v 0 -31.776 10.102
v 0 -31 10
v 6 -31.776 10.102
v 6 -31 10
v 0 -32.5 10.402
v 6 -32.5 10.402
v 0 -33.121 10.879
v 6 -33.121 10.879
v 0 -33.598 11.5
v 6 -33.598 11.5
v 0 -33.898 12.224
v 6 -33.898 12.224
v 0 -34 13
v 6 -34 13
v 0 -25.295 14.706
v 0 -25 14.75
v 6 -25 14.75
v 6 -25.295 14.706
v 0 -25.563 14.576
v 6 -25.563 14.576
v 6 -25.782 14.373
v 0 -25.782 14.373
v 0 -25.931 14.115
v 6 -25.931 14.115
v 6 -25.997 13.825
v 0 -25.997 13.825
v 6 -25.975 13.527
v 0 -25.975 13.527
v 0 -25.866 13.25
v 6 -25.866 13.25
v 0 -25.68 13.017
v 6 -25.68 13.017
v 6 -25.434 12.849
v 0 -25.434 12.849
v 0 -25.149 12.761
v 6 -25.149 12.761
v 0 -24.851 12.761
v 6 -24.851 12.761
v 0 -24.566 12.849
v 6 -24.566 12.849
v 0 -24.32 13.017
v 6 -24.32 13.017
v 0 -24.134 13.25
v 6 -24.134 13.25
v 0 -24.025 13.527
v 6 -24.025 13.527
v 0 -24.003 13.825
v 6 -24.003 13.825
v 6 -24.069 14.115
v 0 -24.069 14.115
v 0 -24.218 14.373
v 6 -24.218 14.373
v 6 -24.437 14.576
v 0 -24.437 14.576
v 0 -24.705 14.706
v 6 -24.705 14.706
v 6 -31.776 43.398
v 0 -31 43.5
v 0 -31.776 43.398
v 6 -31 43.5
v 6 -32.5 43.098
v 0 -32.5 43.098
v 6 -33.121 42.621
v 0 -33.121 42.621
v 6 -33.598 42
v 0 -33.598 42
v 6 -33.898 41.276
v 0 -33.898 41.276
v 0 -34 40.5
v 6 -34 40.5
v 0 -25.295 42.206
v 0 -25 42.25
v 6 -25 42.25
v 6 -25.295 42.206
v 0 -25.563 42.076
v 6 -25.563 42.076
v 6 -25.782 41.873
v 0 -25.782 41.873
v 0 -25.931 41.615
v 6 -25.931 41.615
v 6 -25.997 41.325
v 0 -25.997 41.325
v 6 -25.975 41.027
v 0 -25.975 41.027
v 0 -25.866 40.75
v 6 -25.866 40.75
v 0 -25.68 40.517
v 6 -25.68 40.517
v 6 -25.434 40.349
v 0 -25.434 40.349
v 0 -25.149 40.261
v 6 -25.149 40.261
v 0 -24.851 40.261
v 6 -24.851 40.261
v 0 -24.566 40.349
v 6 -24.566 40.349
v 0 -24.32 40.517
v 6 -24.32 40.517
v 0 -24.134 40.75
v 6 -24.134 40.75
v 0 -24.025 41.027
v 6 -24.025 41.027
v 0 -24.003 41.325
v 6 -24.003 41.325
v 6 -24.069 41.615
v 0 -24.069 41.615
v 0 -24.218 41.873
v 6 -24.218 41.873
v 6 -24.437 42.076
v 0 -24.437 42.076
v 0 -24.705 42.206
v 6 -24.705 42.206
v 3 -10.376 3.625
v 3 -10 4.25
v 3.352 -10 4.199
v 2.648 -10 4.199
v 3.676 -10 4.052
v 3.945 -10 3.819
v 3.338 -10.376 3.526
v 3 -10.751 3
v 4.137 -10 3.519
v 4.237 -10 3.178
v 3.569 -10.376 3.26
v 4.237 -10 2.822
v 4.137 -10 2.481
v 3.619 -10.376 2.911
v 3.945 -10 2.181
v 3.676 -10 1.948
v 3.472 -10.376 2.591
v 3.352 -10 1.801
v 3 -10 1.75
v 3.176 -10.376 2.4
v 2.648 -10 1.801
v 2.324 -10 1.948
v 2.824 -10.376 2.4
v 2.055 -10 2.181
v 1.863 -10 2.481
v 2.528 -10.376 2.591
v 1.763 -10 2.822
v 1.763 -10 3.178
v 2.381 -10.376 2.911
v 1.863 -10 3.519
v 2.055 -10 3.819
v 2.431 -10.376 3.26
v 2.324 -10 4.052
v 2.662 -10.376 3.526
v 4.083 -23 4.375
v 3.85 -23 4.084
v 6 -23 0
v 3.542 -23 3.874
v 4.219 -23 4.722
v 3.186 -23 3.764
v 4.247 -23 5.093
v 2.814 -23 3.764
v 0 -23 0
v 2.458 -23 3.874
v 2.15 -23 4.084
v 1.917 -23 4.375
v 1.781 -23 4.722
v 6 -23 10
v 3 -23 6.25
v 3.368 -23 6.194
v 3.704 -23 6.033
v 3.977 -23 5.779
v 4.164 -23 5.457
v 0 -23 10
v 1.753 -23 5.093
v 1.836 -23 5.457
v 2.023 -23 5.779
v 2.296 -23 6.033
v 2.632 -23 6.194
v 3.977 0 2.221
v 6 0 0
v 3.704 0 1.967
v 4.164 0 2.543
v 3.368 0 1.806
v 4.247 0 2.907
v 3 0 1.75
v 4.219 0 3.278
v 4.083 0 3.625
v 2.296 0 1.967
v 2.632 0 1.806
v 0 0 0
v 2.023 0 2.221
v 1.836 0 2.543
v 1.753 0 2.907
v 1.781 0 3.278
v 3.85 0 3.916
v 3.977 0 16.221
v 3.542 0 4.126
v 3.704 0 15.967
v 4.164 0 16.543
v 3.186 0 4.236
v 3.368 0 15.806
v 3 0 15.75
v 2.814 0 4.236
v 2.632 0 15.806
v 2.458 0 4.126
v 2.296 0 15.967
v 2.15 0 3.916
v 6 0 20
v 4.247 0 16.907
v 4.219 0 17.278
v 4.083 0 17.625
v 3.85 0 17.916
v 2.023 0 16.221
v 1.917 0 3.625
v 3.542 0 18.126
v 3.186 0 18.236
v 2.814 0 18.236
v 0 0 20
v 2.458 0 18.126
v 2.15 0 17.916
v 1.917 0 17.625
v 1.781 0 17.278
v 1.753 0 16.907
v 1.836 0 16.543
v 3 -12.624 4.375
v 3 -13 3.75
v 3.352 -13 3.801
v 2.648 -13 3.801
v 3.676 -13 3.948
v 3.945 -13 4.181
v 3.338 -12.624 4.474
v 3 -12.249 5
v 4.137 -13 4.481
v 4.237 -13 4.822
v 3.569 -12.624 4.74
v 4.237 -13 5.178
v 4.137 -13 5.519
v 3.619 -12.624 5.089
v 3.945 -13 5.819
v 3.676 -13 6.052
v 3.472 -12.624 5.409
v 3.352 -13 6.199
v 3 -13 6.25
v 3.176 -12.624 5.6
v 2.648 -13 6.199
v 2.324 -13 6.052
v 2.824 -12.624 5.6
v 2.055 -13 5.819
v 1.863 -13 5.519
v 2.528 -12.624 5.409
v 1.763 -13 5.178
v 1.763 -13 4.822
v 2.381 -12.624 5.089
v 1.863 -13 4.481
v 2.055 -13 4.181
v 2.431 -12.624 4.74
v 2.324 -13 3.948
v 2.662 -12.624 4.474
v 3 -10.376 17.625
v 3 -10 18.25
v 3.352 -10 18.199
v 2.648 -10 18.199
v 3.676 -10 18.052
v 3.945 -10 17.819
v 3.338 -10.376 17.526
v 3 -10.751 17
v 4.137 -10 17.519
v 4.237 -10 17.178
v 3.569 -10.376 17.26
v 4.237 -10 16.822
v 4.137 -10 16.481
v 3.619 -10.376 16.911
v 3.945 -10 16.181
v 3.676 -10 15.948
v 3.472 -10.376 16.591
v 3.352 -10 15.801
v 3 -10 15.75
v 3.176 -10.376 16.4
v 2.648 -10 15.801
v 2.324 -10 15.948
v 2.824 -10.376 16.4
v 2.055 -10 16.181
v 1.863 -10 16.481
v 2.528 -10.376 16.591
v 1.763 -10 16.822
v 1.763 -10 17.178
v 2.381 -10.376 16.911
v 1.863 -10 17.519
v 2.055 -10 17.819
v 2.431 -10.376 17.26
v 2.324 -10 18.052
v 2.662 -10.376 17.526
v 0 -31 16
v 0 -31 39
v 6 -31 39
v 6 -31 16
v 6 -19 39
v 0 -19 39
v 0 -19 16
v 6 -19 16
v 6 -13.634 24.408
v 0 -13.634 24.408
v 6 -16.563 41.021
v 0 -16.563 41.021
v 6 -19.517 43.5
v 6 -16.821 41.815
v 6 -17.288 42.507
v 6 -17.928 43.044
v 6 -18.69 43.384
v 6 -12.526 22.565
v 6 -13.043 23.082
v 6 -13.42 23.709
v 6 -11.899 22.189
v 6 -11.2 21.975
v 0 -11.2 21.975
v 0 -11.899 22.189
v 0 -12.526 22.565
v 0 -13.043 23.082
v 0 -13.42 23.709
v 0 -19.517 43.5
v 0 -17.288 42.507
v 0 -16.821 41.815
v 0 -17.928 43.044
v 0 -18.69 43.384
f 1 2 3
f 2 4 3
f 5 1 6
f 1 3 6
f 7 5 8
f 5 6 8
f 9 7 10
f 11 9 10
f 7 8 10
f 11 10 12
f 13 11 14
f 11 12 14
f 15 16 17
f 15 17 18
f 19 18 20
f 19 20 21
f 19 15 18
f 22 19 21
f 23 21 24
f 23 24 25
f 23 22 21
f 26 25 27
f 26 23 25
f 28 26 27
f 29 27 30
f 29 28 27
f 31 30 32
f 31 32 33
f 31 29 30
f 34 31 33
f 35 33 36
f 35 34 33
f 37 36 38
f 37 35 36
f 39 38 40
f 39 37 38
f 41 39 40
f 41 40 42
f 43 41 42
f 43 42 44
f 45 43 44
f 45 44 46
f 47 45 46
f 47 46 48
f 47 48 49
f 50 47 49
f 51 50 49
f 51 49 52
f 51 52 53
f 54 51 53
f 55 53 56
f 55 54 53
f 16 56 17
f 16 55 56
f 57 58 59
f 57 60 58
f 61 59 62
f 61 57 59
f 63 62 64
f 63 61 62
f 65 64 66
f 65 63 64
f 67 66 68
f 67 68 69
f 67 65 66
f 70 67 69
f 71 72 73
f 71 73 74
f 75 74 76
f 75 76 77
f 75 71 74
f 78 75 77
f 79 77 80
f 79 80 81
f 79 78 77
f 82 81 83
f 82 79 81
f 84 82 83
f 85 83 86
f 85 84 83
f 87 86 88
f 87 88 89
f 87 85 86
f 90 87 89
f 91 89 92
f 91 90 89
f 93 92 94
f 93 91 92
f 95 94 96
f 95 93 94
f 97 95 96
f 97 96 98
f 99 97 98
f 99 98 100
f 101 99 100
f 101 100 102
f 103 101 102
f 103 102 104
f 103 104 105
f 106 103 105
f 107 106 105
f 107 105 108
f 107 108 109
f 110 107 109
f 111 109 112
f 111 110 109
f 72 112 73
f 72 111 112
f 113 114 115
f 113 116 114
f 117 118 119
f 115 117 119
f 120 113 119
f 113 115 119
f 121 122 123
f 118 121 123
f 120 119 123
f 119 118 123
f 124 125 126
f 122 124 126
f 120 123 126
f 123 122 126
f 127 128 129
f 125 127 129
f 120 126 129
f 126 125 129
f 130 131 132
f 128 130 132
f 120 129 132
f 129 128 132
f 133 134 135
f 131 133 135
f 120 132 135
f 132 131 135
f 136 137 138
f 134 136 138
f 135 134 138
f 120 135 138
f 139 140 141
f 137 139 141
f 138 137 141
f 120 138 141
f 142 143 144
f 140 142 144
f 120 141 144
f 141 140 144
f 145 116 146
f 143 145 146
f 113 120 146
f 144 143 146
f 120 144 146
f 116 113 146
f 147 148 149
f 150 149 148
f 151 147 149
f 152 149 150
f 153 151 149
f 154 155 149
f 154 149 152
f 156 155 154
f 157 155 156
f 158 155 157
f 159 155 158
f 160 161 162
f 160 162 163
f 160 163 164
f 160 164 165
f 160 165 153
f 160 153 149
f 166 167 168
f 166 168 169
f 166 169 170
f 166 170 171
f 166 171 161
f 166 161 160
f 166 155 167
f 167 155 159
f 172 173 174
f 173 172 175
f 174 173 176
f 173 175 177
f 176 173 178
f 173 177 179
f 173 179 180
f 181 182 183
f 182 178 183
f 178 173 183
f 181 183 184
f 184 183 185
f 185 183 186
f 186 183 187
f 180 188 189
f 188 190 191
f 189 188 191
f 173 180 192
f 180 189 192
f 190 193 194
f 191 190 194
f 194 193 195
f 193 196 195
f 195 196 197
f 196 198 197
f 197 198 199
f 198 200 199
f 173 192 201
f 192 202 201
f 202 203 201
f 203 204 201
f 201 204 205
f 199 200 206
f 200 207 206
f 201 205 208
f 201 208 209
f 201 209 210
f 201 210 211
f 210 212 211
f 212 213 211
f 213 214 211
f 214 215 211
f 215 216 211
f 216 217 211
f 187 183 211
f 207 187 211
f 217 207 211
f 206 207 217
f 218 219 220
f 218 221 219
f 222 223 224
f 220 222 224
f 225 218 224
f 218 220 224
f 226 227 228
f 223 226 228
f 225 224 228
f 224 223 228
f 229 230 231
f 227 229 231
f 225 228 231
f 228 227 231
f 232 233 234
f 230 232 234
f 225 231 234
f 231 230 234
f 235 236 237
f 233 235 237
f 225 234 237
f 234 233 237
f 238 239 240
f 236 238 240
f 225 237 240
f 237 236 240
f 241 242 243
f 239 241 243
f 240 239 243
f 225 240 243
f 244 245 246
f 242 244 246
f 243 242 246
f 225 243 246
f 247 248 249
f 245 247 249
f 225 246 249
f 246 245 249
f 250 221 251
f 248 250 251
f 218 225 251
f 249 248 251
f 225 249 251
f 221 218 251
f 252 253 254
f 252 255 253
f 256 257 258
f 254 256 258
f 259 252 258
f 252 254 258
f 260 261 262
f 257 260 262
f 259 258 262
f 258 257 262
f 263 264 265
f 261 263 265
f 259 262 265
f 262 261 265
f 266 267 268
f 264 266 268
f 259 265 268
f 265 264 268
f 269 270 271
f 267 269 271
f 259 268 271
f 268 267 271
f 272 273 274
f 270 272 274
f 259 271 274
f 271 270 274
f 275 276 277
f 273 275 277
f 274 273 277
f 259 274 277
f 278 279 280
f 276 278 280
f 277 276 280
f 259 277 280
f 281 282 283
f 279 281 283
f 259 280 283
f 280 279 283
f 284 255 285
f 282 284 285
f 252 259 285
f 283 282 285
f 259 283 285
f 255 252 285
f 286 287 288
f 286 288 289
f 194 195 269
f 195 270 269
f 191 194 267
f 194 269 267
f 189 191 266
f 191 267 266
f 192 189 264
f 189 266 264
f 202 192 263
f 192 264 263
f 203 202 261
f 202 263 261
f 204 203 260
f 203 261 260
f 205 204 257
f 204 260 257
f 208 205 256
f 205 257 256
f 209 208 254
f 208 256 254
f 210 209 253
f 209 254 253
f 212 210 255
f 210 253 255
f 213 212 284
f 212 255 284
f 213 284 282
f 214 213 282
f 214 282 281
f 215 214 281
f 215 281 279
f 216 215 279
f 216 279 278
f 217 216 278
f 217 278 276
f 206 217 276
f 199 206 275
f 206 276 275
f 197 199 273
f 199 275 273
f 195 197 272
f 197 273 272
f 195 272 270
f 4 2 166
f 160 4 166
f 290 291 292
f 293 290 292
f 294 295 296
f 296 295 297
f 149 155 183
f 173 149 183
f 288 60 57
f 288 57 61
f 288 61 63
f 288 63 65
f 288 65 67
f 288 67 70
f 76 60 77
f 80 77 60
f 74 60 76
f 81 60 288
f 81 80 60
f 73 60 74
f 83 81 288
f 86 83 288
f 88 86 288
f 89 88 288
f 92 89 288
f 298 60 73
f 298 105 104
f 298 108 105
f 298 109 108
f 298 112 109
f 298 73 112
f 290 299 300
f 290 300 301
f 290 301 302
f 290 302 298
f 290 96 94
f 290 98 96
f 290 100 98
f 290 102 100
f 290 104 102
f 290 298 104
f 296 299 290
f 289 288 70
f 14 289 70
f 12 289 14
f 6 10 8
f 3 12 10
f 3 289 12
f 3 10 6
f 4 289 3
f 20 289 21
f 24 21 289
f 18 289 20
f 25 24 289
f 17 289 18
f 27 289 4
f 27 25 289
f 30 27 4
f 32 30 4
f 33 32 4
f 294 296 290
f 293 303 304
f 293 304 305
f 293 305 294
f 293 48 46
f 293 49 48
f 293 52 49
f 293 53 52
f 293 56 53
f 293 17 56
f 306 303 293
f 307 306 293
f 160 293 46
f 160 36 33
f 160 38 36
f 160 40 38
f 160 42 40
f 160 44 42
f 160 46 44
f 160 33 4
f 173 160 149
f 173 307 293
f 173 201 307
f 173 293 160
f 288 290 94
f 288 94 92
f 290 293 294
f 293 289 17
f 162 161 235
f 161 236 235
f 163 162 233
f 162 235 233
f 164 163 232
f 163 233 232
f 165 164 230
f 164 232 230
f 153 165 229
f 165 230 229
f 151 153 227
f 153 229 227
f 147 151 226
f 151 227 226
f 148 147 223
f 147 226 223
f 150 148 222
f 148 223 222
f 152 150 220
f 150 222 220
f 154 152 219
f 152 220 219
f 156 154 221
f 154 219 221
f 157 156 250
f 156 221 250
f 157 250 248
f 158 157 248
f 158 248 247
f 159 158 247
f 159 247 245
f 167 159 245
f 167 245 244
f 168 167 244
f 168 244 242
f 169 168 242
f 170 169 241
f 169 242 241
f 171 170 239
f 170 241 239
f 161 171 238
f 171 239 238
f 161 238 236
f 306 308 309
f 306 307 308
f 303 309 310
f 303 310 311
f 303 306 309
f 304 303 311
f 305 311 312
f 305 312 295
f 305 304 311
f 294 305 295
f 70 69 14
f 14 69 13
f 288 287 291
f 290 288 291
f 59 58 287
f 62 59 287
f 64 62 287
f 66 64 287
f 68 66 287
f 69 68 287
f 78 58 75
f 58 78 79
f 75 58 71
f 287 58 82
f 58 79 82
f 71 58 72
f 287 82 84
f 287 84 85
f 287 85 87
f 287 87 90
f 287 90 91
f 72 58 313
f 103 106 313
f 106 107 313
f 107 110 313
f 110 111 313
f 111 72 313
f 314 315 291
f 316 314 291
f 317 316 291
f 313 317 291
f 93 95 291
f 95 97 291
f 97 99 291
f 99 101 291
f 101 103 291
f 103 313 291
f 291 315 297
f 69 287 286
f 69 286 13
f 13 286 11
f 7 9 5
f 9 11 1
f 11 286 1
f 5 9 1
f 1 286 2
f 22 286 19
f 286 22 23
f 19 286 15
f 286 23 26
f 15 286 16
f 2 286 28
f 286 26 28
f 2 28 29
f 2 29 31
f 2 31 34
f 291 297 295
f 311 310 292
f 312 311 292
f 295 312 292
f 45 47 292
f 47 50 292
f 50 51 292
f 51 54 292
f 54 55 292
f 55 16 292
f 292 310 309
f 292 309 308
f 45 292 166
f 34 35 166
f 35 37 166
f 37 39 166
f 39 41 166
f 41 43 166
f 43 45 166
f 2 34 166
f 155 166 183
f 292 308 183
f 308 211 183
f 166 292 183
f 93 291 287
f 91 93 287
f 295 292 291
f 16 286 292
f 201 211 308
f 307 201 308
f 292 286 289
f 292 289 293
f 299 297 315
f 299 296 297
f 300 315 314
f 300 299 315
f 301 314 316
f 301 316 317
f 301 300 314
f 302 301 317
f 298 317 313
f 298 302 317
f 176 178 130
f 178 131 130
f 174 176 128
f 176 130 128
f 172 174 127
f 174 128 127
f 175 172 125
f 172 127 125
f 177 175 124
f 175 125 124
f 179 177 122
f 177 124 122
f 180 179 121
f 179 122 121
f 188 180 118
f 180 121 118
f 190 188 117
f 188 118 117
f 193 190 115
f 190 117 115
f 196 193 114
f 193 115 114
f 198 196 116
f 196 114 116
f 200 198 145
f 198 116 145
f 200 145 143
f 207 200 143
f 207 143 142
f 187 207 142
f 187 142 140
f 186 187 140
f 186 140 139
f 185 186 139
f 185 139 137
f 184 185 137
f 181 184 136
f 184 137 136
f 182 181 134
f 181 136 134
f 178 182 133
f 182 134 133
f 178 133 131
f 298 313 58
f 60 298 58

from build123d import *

# Parameters (mm, degrees)
SKETCH2_R                                 = 1
SKETCH2_W                                 = 23
SKETCH2_H                                 = 12
BOSS_EXTRUDE1_DEPTH                       = 6
CUT_EXTRUDE1_REACH                        = 57.536
SKETCH3_W                                 = 10
SKETCH3_H                                 = 11
FILLET1_R                                 = 3
TAP_DRILL_FOR_M3X0_5_TAP1_D               = 2.5
TAP_DRILL_FOR_M3X0_5_TAP1_DEPTH           = 10
TAP_DRILL_FOR_M3X0_5_TAP1_TIP             = 0.751075774
TAP_DRILL_FOR_M3X0_5_TAP1_ON_FACE_2_D     = 2.5
TAP_DRILL_FOR_M3X0_5_TAP1_ON_FACE_2_DEPTH = 10
TAP_DRILL_FOR_M3X0_5_TAP1_ON_FACE_2_TIP   = 0.751075774


with BuildPart() as part:
    # Sketch2 → Boss-Extrude1 (new body)
    with BuildSketch(Plane(origin=(0, 0, 0), x_dir=(0, 0, -1), z_dir=(1, 0, 0))):
        Polygon((-20, 0), (-22.339658165, -13.268860813), (-43.5, -17), (-43.5, -34), (0, -34), (0, 0), align=None)
        with Locations(Location((-41.25, -25, 0), (0, 0, 180))):
            Circle(SKETCH2_R, mode=Mode.SUBTRACT)
        with Locations(Location((-13.75, -25, 0), (0, 0, 180))):
            Circle(SKETCH2_R, mode=Mode.SUBTRACT)
        with Locations((-27.5, -25)):
            Rectangle(SKETCH2_W, SKETCH2_H, mode=Mode.SUBTRACT)
    extrude(amount=BOSS_EXTRUDE1_DEPTH)

    # Sketch3 → Cut-Extrude1 (cut, up to next)
    with BuildSketch(Plane.ZY, mode=Mode.PRIVATE) as cut_extrude1_sk1:
        with Locations((5, -28.5)):
            Rectangle(SKETCH3_W, SKETCH3_H)
    cut_extrude1_tool1 = extrude(cut_extrude1_sk1.sketch, amount=-CUT_EXTRUDE1_REACH, mode=Mode.PRIVATE) & part.part
    add(cut_extrude1_tool1.solids().sort_by_distance((0, -28.5, 5))[0], mode=Mode.SUBTRACT)

    # Fillet1
    fillet1_edges = [part.edges().sort_by_distance(p)[0] for p in [
        (3, -34, 43.5),
        (3, -17, 43.5),
        (3, -13.268860813, 22.339658165),
        (3, -34, 10),
    ]]
    fillet(fillet1_edges, radius=FILLET1_R)

    # Tap Drill for M3x0.5 Tap1
    with Locations(Plane(origin=(3, 0, 3), x_dir=(0, 0, 1), z_dir=(0, 1, 0))):
        with Locations((0, 0), (14, 0)):
            Hole(TAP_DRILL_FOR_M3X0_5_TAP1_D / 2, depth=TAP_DRILL_FOR_M3X0_5_TAP1_DEPTH)
            with Locations((0, 0, -(TAP_DRILL_FOR_M3X0_5_TAP1_DEPTH + TAP_DRILL_FOR_M3X0_5_TAP1_TIP / 2))):  # 118° drill point
                Cone(0, TAP_DRILL_FOR_M3X0_5_TAP1_D / 2, TAP_DRILL_FOR_M3X0_5_TAP1_TIP, mode=Mode.SUBTRACT)

    # Tap Drill for M3x0.5 Tap1 on face 2
    with Locations(Plane(origin=(3, -23, 5), x_dir=(0, 0, -1), z_dir=(0, -1, 0))):
        with Locations((0, 0)):
            Hole(TAP_DRILL_FOR_M3X0_5_TAP1_ON_FACE_2_D / 2, depth=TAP_DRILL_FOR_M3X0_5_TAP1_ON_FACE_2_DEPTH)
            with Locations((0, 0, -(TAP_DRILL_FOR_M3X0_5_TAP1_ON_FACE_2_DEPTH + TAP_DRILL_FOR_M3X0_5_TAP1_ON_FACE_2_TIP / 2))):  # 118° drill point
                Cone(0, TAP_DRILL_FOR_M3X0_5_TAP1_ON_FACE_2_D / 2, TAP_DRILL_FOR_M3X0_5_TAP1_ON_FACE_2_TIP, mode=Mode.SUBTRACT)


solid = part.part
